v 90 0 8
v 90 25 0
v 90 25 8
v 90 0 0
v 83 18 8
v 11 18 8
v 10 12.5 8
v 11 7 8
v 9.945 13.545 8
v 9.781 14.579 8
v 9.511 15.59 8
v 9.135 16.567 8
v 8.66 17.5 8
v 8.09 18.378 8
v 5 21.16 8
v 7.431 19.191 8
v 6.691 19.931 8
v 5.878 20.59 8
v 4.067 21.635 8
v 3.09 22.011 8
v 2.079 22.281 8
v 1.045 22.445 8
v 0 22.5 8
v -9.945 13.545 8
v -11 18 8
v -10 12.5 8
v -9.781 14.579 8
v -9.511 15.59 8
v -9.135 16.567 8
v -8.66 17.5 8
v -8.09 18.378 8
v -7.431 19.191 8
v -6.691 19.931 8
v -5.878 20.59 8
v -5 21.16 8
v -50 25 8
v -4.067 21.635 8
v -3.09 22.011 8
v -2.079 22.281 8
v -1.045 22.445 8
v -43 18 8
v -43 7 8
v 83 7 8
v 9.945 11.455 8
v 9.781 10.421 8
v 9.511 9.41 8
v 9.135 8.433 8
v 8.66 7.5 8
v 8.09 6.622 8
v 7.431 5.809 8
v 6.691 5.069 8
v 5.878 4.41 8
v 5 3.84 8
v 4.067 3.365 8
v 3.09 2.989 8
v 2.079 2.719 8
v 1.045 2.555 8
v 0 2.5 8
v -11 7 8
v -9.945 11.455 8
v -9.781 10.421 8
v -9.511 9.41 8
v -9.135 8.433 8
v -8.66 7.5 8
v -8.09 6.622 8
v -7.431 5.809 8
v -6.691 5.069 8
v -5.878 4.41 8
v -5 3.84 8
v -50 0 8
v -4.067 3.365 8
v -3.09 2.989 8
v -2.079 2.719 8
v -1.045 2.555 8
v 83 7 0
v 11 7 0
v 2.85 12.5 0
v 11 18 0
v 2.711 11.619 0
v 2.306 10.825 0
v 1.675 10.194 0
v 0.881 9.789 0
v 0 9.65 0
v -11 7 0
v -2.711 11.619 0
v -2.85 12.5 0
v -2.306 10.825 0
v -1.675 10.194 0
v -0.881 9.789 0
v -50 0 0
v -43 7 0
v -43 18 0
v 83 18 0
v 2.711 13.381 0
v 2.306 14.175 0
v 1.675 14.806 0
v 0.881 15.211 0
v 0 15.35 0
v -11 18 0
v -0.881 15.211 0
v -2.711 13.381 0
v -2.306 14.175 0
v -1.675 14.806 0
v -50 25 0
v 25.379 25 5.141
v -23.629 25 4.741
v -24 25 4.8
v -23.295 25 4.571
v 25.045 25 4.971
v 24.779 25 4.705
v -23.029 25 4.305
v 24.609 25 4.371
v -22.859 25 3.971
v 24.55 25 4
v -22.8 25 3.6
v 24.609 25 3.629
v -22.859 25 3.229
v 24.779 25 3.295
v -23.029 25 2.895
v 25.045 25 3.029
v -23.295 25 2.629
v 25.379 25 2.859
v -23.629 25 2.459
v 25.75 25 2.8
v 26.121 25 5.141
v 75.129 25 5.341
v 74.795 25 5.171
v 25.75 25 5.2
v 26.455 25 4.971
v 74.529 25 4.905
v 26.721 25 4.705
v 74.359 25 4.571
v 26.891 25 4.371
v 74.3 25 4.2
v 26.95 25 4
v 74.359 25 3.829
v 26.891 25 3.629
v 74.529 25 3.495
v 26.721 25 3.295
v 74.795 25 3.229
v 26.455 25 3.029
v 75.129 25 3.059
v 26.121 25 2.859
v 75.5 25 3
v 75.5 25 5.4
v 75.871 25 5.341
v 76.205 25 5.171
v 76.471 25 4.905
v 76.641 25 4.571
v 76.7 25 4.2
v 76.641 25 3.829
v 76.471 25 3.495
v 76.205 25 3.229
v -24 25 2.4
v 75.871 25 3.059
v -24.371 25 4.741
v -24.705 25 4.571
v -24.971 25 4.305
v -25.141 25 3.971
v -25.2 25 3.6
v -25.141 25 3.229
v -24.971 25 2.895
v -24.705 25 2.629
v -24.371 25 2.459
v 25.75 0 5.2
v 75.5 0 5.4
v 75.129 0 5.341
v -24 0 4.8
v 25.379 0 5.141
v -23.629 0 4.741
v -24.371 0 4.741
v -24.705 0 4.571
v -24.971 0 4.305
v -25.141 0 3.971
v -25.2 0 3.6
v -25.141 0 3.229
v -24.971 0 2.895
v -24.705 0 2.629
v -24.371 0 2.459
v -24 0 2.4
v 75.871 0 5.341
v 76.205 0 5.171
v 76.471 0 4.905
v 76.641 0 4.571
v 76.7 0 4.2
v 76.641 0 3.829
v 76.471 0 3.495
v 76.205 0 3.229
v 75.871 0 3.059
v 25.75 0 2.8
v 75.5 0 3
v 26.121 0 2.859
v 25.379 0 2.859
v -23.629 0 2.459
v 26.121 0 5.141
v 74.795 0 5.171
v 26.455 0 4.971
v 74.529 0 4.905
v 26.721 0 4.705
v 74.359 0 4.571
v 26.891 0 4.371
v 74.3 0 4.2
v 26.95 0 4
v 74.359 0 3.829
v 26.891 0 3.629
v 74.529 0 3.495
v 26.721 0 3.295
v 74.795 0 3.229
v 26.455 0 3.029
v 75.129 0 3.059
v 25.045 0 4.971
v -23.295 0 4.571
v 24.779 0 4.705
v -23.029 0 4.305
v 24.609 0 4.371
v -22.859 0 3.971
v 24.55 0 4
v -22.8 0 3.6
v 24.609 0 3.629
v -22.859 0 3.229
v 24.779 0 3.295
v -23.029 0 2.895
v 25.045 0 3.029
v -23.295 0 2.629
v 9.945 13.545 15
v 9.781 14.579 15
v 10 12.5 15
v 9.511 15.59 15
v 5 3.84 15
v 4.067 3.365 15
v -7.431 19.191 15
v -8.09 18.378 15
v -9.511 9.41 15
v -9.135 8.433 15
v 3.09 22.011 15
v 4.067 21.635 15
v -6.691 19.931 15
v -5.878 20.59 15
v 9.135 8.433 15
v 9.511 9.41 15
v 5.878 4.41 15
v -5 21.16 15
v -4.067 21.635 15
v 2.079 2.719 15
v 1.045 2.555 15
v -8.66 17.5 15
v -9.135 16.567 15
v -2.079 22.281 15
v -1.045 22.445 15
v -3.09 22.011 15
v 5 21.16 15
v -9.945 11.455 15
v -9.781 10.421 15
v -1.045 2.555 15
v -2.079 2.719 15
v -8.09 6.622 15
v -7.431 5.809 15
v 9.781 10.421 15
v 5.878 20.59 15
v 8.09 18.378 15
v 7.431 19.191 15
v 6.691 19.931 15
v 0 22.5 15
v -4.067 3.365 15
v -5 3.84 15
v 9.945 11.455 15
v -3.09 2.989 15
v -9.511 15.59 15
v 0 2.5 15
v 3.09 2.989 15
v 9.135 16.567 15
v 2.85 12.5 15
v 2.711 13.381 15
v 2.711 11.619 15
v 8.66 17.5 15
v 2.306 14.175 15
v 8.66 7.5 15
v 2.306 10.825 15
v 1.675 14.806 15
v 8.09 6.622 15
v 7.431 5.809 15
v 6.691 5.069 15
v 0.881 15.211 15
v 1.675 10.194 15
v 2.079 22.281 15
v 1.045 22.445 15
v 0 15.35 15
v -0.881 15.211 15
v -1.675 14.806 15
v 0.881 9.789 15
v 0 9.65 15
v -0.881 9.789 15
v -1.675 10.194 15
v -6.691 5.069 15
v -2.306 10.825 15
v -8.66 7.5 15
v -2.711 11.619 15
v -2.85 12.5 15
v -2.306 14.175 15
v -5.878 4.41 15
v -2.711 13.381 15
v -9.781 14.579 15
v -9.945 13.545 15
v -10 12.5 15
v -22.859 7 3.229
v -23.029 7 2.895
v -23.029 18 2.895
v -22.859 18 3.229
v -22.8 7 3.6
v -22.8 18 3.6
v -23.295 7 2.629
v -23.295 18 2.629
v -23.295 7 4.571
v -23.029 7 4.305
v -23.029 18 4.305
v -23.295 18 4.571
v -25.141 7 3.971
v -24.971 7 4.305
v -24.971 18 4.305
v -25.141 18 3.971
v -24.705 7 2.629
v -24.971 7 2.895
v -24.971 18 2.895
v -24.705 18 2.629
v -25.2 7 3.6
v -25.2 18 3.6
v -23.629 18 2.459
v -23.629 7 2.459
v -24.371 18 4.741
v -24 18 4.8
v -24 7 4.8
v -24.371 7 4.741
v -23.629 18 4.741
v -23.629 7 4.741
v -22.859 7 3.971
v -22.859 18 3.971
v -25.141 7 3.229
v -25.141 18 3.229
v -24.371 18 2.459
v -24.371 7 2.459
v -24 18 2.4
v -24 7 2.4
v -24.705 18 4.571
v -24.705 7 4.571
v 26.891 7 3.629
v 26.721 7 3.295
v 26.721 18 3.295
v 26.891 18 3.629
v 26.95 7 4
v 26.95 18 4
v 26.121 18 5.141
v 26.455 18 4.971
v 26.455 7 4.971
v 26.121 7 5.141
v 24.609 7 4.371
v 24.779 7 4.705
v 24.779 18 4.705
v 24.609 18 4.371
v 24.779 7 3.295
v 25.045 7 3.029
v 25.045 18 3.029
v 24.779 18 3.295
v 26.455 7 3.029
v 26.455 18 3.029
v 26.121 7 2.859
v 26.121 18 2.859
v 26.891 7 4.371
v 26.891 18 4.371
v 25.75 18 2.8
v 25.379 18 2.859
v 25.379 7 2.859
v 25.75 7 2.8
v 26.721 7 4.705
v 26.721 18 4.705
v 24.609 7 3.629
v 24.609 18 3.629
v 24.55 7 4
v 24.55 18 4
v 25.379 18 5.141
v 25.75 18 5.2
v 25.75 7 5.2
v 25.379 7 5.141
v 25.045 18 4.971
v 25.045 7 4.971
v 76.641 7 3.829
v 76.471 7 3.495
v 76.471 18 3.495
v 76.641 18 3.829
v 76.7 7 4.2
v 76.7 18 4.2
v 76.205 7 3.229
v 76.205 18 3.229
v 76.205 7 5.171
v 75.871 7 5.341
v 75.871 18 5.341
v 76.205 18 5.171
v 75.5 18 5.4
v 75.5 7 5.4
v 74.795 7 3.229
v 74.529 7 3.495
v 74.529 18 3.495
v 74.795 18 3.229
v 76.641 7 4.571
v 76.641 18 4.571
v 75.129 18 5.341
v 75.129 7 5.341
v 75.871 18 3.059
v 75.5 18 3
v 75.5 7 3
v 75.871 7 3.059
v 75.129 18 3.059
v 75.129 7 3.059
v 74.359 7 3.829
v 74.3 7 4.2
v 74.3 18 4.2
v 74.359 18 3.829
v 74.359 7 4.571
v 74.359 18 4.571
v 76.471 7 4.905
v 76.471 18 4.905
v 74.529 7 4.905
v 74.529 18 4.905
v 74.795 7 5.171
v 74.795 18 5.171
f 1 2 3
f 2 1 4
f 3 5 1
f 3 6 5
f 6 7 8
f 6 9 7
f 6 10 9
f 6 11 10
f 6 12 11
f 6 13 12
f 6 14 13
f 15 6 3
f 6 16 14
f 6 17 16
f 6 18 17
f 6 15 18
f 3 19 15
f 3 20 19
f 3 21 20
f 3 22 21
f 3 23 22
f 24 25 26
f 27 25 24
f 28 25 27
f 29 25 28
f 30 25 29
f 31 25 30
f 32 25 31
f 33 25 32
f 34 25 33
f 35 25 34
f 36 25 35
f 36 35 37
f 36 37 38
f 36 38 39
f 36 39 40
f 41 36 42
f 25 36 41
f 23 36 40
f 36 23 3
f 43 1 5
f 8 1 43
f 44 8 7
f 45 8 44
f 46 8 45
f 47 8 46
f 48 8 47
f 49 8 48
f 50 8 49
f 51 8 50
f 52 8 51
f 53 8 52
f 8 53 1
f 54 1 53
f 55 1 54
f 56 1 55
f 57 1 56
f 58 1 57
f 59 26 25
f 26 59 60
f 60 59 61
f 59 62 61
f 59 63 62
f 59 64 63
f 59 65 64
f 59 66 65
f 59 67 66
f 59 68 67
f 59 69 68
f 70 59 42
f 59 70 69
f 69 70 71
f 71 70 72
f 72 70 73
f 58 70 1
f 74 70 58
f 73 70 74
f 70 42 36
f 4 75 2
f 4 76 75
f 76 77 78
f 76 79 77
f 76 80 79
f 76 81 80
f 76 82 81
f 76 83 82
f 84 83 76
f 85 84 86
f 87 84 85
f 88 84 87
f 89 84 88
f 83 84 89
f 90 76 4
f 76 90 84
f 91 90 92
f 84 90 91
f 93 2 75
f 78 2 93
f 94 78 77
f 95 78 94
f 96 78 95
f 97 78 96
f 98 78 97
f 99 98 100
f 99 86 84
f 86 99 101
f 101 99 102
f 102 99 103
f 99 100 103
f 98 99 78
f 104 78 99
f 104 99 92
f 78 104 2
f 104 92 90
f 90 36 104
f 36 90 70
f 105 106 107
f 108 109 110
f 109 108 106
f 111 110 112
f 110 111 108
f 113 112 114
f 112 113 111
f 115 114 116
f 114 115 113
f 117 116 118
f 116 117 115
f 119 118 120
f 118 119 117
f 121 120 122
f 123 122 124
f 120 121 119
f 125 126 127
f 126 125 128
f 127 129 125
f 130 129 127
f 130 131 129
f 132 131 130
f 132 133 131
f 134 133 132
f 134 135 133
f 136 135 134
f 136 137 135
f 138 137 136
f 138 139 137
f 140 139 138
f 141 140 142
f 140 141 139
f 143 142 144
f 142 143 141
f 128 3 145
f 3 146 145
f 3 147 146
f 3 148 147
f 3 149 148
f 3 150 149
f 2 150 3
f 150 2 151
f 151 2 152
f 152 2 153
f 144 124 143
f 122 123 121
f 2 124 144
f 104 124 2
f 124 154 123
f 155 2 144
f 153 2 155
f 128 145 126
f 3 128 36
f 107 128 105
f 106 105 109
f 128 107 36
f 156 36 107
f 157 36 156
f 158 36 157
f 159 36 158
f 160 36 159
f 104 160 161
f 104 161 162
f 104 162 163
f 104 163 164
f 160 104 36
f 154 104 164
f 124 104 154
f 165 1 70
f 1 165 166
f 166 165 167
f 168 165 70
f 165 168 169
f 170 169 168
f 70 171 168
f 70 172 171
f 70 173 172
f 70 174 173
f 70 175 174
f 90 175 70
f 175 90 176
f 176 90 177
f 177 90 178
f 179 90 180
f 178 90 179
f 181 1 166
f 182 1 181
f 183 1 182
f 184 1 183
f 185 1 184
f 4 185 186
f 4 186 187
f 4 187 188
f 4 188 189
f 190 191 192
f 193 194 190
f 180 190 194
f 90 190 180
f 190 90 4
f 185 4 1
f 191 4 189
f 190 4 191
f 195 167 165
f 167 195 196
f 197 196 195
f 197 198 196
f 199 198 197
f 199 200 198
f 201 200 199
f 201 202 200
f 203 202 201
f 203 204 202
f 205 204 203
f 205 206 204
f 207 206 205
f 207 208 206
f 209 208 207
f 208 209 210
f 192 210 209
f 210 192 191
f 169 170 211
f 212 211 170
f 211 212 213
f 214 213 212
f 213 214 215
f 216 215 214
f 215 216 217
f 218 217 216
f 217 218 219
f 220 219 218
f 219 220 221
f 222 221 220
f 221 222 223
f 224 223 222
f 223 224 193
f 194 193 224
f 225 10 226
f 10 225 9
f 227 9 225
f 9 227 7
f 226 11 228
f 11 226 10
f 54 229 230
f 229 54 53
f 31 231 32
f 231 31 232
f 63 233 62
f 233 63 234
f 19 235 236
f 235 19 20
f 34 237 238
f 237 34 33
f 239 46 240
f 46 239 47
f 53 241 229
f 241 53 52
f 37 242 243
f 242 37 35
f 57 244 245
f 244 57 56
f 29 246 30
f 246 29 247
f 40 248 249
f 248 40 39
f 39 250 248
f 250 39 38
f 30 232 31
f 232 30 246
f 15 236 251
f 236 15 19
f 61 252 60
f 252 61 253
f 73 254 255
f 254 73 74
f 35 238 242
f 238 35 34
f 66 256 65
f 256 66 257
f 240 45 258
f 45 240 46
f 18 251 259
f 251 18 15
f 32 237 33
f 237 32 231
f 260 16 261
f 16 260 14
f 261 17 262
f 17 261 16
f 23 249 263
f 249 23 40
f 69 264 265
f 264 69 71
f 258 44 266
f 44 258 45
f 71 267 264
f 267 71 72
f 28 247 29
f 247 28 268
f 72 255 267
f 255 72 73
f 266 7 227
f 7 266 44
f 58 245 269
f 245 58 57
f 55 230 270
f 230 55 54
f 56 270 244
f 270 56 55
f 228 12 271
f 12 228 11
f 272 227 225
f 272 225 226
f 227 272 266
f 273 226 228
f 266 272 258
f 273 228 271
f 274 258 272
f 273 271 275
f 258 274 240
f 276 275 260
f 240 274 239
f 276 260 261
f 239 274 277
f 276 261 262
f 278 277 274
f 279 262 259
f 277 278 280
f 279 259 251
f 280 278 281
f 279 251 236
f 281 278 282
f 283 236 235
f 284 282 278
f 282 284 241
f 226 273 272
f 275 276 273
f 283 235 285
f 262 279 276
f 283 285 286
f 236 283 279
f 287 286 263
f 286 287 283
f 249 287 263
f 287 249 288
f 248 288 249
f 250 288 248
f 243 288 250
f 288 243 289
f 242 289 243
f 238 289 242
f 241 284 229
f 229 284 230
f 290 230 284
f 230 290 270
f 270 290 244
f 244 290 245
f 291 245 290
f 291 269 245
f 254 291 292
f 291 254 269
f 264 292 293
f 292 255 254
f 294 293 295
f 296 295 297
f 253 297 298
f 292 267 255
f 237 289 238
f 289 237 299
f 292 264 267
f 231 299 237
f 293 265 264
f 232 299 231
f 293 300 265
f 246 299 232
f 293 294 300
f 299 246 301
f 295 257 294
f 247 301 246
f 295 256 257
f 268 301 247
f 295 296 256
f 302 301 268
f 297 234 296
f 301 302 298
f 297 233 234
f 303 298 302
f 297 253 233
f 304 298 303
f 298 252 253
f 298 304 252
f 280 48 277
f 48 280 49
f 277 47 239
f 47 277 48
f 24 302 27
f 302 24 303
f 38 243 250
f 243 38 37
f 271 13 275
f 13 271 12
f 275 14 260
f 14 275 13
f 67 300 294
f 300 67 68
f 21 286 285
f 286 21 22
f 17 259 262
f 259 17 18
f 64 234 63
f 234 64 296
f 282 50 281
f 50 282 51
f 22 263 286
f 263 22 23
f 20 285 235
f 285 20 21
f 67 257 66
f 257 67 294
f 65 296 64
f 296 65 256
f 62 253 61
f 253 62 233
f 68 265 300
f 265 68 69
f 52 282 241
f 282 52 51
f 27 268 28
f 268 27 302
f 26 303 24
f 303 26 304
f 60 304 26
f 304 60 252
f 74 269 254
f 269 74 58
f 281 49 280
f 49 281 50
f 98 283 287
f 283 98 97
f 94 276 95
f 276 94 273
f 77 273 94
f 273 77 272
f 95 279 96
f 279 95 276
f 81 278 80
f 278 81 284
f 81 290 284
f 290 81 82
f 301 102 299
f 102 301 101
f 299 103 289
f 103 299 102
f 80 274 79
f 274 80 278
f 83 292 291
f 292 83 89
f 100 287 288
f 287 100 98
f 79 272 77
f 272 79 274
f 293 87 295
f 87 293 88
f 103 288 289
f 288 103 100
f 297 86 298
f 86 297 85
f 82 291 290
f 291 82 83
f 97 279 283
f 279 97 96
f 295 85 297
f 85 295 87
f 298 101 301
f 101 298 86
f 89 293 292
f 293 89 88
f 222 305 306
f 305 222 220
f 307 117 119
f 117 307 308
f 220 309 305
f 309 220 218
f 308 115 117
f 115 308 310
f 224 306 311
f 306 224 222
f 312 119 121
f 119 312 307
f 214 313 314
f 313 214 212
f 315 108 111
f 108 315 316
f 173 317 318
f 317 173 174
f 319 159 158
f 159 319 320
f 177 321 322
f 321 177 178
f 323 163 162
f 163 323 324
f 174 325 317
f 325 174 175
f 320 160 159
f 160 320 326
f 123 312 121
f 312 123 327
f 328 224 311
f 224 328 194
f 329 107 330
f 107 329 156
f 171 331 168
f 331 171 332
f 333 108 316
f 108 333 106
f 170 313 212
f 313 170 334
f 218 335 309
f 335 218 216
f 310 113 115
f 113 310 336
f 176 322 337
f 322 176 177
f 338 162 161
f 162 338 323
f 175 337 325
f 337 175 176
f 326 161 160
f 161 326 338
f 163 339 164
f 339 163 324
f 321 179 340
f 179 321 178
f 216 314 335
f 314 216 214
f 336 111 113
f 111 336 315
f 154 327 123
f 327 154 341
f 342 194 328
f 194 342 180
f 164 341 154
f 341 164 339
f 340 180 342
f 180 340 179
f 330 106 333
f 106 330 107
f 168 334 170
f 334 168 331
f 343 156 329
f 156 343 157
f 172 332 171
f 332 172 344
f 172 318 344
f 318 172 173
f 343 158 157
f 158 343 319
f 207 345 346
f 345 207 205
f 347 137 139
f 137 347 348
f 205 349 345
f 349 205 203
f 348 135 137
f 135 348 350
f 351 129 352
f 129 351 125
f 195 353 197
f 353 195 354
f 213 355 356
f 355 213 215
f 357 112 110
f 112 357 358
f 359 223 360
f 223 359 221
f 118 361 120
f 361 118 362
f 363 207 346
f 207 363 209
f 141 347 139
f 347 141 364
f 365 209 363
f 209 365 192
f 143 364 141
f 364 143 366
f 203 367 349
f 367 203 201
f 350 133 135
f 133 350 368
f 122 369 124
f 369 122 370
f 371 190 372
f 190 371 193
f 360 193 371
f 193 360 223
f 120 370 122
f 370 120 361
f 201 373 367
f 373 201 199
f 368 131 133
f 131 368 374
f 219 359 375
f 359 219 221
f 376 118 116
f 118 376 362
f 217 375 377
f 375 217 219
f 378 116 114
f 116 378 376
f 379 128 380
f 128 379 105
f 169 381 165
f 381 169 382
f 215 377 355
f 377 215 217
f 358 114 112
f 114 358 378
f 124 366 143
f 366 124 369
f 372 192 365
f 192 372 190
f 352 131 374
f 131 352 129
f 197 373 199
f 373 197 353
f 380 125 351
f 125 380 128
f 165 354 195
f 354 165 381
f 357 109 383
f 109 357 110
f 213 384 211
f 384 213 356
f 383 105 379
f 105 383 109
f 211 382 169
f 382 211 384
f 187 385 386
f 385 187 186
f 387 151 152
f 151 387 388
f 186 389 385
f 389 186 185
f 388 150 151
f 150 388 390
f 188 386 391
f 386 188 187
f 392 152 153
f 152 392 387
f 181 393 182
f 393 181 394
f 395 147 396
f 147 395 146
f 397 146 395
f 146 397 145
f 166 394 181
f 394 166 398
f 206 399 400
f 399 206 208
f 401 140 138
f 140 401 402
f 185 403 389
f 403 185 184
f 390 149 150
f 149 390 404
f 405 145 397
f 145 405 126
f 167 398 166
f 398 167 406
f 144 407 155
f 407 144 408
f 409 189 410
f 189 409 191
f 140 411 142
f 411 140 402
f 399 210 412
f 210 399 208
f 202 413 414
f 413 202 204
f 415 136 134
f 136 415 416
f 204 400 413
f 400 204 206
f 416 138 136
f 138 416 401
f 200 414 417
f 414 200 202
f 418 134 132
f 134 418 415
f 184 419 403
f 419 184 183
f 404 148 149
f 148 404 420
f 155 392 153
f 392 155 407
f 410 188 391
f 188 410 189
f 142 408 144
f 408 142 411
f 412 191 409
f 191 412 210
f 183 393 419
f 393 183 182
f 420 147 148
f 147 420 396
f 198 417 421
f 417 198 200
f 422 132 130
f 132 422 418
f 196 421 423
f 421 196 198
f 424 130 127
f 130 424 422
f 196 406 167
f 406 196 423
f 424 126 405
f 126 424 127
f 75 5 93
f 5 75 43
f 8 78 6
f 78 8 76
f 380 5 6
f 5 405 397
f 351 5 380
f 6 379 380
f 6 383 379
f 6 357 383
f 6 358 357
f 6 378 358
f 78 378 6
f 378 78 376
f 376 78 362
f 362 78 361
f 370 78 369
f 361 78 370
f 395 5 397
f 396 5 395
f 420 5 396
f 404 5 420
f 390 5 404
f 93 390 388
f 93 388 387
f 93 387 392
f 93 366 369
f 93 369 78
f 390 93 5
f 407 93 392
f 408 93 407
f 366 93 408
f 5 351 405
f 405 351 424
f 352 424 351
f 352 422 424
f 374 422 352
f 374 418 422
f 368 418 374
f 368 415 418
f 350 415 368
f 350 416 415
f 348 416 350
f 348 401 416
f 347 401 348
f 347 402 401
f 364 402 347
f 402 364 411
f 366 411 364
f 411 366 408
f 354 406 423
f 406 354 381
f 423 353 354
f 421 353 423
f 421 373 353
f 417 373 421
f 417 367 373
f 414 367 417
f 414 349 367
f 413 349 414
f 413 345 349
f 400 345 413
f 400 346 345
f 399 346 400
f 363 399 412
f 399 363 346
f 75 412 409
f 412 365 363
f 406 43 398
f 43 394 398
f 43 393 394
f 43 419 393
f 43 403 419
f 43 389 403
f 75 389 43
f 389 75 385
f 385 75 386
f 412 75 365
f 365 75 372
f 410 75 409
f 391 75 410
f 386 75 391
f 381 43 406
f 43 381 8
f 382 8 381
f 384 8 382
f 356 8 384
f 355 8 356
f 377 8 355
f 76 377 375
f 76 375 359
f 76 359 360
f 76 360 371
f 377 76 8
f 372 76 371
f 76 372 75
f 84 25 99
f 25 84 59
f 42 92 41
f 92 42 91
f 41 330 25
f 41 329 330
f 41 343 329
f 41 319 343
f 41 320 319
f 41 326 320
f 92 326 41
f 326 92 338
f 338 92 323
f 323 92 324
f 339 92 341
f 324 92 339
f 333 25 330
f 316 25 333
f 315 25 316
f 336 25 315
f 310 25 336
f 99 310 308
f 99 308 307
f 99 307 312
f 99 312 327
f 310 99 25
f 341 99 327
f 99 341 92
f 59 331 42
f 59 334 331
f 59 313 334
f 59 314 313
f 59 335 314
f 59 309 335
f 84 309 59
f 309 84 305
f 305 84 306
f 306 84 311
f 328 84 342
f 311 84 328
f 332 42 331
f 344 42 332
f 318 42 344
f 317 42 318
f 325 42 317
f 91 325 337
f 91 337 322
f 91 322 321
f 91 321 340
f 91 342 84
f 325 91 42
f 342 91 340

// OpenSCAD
difference(){
union(){
translate([-50,0,0])cube([140,25,8]);
translate([0,12.5,0])cylinder(d=20,h=15,$fn=60);
}    
translate([0,12.5,0])cylinder(d=5.7,h=15,$fn=20);
translate([-24,-1,3.6])rotate([-90,0,0])
    cylinder(d=2.4,h=50,$fn=20);
translate([25.75,-1,4])rotate([-90,0,0])
    cylinder(d=2.4,h=50,$fn=20);
translate([75.5,-1,4.2])rotate([-90,0,0])
    cylinder(d=2.4,h=50,$fn=20);
translate([11,7,-1])cube([72,11,12]);
translate([-43,7,-1])cube([32,11,12]);
}
